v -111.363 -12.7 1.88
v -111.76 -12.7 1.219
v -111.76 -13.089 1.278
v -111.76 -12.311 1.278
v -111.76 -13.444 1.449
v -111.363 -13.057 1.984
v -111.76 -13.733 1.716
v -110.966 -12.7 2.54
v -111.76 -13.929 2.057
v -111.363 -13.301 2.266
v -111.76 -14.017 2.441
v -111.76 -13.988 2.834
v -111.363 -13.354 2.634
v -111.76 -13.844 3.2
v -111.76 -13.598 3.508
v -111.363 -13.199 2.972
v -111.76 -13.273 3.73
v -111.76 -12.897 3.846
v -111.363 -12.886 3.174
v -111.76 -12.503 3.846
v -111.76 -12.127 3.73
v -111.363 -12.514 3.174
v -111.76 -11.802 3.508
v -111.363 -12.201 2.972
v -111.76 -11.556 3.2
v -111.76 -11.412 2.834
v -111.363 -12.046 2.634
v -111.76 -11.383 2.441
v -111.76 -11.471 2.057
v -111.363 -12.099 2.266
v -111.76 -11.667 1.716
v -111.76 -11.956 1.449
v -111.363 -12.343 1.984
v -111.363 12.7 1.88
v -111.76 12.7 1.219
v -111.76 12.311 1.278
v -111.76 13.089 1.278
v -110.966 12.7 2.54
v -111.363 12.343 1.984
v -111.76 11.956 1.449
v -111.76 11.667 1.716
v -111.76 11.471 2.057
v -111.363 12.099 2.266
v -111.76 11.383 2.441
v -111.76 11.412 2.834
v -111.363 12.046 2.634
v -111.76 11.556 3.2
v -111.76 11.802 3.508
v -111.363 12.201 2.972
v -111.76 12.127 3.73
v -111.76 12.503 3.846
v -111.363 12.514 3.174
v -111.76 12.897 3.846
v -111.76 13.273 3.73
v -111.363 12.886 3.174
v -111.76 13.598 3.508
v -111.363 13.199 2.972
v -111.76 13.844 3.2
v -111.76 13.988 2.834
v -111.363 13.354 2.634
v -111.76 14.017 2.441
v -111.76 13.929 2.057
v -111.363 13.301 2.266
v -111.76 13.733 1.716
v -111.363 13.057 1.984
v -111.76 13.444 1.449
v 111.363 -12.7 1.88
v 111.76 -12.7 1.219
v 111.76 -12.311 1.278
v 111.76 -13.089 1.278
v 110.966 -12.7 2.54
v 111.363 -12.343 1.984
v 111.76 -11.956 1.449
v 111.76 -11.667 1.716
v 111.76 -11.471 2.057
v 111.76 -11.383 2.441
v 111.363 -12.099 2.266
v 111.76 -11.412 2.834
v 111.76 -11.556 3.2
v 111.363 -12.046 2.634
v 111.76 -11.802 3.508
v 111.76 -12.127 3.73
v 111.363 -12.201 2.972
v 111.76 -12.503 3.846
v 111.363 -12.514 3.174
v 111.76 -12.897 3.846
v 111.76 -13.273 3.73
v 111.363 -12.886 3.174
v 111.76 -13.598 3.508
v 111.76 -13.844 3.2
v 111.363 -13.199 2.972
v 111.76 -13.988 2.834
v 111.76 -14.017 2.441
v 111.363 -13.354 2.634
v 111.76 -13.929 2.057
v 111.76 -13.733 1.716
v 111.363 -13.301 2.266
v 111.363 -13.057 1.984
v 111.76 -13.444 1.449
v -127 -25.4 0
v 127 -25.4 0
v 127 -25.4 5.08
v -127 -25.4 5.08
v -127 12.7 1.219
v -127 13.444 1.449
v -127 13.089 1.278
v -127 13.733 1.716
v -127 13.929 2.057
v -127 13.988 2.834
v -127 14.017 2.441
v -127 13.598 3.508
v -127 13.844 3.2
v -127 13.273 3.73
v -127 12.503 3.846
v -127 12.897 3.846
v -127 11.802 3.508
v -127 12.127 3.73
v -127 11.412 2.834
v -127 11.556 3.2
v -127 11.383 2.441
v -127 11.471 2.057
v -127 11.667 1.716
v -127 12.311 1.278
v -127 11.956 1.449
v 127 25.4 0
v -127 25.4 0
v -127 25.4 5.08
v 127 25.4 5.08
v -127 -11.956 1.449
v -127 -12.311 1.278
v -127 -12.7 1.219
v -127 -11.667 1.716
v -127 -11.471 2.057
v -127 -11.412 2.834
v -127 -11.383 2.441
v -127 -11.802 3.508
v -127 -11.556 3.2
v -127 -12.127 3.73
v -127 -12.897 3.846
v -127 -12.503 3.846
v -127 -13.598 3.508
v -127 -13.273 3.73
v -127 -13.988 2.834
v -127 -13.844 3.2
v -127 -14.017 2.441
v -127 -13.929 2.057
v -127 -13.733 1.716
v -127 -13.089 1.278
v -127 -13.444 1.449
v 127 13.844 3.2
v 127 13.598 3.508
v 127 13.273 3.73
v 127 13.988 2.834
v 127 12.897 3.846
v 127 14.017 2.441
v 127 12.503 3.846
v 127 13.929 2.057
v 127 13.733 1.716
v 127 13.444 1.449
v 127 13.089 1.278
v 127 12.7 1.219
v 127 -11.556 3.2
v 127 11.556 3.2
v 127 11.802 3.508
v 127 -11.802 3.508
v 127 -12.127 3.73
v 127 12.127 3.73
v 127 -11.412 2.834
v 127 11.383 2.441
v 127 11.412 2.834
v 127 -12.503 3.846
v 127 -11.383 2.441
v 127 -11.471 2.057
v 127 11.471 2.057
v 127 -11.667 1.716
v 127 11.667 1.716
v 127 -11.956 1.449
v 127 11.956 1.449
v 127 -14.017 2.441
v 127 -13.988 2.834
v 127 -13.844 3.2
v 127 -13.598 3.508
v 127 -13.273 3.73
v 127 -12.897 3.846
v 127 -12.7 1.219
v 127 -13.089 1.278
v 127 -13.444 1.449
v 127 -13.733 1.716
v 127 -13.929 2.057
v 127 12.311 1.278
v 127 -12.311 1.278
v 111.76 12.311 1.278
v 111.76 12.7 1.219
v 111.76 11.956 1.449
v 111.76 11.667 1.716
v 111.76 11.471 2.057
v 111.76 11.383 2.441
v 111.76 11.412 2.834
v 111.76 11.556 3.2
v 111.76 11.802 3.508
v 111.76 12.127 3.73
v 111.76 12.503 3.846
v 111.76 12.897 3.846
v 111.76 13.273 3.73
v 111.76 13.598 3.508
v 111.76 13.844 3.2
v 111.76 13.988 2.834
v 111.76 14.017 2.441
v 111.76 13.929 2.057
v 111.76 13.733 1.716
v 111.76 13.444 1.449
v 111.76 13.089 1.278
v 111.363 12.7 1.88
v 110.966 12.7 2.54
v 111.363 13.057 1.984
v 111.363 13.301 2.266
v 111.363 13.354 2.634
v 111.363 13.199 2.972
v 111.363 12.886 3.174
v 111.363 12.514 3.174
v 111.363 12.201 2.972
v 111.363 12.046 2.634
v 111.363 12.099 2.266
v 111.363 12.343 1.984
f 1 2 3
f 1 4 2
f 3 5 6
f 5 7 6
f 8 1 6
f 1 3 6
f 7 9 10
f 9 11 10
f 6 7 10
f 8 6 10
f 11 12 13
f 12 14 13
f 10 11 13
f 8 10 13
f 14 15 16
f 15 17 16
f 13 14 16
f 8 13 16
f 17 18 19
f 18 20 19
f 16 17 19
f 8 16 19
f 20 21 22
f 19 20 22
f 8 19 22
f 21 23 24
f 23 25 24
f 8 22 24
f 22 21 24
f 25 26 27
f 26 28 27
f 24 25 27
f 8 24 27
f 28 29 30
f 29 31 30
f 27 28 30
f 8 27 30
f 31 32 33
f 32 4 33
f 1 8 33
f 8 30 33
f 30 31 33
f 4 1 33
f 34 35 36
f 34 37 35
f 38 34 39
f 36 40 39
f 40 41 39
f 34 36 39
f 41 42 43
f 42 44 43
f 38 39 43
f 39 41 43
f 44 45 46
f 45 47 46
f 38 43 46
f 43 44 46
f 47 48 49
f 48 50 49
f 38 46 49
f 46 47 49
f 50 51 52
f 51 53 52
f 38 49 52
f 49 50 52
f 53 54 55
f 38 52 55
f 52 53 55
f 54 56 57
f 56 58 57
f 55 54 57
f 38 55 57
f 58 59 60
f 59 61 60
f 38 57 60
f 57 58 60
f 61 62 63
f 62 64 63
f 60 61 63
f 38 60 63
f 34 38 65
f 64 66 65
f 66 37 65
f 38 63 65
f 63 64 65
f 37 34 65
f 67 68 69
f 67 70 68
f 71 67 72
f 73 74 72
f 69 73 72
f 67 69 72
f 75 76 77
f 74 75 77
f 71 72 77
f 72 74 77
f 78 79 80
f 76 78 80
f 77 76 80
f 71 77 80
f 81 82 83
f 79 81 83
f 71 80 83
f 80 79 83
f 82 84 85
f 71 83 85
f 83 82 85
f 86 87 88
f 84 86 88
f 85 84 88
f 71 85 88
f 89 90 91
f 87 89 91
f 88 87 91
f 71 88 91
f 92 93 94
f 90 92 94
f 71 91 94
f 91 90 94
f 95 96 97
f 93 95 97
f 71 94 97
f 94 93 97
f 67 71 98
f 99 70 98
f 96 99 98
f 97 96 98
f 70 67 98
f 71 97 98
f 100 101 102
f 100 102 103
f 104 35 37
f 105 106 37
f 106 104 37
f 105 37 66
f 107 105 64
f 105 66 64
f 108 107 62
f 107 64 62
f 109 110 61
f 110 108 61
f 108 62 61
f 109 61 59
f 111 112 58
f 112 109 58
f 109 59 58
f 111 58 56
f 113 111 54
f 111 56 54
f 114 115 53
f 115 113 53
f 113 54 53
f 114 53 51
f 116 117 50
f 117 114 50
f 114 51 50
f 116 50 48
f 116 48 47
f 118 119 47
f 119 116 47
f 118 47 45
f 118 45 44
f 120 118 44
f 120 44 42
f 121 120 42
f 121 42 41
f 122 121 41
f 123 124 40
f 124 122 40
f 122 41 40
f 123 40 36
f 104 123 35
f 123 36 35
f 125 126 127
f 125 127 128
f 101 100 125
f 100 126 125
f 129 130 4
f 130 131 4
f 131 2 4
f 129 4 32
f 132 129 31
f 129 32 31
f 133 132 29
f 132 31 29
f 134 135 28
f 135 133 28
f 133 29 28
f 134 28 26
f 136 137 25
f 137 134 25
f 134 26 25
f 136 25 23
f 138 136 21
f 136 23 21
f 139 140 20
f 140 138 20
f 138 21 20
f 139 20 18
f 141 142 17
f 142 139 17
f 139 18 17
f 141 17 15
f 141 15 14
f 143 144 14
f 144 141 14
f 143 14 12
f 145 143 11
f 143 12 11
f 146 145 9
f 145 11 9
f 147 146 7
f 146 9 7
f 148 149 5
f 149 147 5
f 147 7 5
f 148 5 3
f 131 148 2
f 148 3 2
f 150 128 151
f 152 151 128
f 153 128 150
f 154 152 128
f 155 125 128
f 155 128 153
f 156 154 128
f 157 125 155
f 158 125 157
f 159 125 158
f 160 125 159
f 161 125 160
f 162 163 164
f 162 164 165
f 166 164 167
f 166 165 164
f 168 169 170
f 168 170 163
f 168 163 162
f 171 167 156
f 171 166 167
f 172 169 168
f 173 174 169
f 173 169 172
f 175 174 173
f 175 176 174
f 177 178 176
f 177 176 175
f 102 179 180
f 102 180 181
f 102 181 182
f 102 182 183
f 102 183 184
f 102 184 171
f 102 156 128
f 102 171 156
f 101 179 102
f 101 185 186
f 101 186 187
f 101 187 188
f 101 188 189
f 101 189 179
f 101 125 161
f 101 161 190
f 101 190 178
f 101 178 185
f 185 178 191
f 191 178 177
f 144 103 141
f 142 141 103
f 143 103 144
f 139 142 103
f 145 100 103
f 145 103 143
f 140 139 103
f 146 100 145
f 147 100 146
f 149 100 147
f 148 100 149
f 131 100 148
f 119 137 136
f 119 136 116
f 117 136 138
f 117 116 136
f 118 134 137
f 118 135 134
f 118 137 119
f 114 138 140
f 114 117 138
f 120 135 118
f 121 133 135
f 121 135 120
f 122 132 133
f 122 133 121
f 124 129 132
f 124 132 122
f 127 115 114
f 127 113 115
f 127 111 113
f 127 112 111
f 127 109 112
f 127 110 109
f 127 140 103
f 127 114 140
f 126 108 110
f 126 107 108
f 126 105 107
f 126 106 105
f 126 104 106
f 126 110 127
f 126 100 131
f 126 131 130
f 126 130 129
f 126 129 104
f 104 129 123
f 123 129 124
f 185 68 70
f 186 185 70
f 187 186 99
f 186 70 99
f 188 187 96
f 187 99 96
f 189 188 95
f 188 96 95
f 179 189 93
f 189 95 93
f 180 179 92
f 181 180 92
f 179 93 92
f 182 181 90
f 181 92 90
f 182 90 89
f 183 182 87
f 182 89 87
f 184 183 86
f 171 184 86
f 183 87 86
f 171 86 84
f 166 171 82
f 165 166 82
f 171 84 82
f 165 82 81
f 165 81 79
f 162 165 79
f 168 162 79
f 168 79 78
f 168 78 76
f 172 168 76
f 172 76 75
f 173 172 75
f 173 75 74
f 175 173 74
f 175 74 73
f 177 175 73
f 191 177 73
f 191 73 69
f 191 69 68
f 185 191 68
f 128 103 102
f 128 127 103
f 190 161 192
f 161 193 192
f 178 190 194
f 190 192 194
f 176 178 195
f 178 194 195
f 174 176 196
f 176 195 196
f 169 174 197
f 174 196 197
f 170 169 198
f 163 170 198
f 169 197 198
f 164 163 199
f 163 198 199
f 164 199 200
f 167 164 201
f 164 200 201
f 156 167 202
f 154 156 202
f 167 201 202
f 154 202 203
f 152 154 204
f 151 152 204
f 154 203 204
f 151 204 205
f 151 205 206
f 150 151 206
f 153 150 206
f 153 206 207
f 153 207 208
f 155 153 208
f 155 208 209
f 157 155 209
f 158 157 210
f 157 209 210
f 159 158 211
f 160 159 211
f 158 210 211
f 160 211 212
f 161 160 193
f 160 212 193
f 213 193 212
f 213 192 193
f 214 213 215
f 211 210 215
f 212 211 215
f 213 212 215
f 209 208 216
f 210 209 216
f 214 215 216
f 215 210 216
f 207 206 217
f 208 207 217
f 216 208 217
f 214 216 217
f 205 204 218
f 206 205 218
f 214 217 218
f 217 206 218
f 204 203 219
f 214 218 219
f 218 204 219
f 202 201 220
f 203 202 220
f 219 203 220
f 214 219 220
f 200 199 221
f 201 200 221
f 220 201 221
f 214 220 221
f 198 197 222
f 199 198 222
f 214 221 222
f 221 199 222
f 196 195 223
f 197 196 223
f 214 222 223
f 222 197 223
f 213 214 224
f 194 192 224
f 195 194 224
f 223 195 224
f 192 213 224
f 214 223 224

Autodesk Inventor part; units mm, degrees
ref_plane "YZ Plane" through (0, 0, 0) normal (1, 0, 0) x (0, 1, 0)
ref_plane "XZ Plane" through (0, 0, 0) normal (0, 1, 0) x (-1, 0, 0)
ref_plane "XY Plane" through (0, 0, 0) normal (0, 0, 1) x (1, 0, 0)
sketch "Sketch1" plane through (0, 0, 0) normal (0, 0, 1) x (1, 0, 0)
  line L0 (-127, 25.4) -> (127, 25.4)
  line L1 (127, 25.4) -> (127, -25.4)
  line L2 (127, -25.4) -> (-127, -25.4)
  line L3 (-127, -25.4) -> (-127, 25.4)
  point P0 (0, 0)
  dimension "d0" = 254
  dimension "d1" = 50.8
  dimension "d2" = 25.4
  dimension "d3" = 127
extrude "Extrusion1" add sketch "Sketch1" along normal blind 5.08
sketch "Sketch2" plane through (127, -25.4, 0) normal (1, 0, 0) x (0, 0, -1)
  line L0 (-5.08, 50.8) -> (-5.08, 0) projected
  line L1 (0, 0) -> (-5.08, 0) projected
  line L2 (0, 50.8) -> (0, 0) projected
  line L3 (0, 50.8) -> (-5.08, 50.8) projected
  line L4 (-2.54, 50.8) -> (-2.54, 0) construction
  line L5 (1.016, 25.4) -> (-6.096, 25.4) construction
  point P0 (0, 25.4)
  point P1 (-2.54, 38.1)
  point P2 (-2.54, 12.7)
  dimension "d6" = 25.4
hole "Hole1" at (127, 12.7, 2.54) at (127, -12.7, 2.54) direction (-1, 0, 0) diameter 2.6416 depth 15.24 tip angle 118 thread size "6-32 UNC" class "2B" standard "ANSI Unified Screw Threads"
mirror "Mirror1" about plane through (0, 0, 0) normal (1, 0, 0) of "Hole1"
equation "\"d2\" = 0.5 * d1"
equation "\"d3\" = 0.5 * d0"
properties part number "J001394" material "ALUMINUM, 6061-T651"
